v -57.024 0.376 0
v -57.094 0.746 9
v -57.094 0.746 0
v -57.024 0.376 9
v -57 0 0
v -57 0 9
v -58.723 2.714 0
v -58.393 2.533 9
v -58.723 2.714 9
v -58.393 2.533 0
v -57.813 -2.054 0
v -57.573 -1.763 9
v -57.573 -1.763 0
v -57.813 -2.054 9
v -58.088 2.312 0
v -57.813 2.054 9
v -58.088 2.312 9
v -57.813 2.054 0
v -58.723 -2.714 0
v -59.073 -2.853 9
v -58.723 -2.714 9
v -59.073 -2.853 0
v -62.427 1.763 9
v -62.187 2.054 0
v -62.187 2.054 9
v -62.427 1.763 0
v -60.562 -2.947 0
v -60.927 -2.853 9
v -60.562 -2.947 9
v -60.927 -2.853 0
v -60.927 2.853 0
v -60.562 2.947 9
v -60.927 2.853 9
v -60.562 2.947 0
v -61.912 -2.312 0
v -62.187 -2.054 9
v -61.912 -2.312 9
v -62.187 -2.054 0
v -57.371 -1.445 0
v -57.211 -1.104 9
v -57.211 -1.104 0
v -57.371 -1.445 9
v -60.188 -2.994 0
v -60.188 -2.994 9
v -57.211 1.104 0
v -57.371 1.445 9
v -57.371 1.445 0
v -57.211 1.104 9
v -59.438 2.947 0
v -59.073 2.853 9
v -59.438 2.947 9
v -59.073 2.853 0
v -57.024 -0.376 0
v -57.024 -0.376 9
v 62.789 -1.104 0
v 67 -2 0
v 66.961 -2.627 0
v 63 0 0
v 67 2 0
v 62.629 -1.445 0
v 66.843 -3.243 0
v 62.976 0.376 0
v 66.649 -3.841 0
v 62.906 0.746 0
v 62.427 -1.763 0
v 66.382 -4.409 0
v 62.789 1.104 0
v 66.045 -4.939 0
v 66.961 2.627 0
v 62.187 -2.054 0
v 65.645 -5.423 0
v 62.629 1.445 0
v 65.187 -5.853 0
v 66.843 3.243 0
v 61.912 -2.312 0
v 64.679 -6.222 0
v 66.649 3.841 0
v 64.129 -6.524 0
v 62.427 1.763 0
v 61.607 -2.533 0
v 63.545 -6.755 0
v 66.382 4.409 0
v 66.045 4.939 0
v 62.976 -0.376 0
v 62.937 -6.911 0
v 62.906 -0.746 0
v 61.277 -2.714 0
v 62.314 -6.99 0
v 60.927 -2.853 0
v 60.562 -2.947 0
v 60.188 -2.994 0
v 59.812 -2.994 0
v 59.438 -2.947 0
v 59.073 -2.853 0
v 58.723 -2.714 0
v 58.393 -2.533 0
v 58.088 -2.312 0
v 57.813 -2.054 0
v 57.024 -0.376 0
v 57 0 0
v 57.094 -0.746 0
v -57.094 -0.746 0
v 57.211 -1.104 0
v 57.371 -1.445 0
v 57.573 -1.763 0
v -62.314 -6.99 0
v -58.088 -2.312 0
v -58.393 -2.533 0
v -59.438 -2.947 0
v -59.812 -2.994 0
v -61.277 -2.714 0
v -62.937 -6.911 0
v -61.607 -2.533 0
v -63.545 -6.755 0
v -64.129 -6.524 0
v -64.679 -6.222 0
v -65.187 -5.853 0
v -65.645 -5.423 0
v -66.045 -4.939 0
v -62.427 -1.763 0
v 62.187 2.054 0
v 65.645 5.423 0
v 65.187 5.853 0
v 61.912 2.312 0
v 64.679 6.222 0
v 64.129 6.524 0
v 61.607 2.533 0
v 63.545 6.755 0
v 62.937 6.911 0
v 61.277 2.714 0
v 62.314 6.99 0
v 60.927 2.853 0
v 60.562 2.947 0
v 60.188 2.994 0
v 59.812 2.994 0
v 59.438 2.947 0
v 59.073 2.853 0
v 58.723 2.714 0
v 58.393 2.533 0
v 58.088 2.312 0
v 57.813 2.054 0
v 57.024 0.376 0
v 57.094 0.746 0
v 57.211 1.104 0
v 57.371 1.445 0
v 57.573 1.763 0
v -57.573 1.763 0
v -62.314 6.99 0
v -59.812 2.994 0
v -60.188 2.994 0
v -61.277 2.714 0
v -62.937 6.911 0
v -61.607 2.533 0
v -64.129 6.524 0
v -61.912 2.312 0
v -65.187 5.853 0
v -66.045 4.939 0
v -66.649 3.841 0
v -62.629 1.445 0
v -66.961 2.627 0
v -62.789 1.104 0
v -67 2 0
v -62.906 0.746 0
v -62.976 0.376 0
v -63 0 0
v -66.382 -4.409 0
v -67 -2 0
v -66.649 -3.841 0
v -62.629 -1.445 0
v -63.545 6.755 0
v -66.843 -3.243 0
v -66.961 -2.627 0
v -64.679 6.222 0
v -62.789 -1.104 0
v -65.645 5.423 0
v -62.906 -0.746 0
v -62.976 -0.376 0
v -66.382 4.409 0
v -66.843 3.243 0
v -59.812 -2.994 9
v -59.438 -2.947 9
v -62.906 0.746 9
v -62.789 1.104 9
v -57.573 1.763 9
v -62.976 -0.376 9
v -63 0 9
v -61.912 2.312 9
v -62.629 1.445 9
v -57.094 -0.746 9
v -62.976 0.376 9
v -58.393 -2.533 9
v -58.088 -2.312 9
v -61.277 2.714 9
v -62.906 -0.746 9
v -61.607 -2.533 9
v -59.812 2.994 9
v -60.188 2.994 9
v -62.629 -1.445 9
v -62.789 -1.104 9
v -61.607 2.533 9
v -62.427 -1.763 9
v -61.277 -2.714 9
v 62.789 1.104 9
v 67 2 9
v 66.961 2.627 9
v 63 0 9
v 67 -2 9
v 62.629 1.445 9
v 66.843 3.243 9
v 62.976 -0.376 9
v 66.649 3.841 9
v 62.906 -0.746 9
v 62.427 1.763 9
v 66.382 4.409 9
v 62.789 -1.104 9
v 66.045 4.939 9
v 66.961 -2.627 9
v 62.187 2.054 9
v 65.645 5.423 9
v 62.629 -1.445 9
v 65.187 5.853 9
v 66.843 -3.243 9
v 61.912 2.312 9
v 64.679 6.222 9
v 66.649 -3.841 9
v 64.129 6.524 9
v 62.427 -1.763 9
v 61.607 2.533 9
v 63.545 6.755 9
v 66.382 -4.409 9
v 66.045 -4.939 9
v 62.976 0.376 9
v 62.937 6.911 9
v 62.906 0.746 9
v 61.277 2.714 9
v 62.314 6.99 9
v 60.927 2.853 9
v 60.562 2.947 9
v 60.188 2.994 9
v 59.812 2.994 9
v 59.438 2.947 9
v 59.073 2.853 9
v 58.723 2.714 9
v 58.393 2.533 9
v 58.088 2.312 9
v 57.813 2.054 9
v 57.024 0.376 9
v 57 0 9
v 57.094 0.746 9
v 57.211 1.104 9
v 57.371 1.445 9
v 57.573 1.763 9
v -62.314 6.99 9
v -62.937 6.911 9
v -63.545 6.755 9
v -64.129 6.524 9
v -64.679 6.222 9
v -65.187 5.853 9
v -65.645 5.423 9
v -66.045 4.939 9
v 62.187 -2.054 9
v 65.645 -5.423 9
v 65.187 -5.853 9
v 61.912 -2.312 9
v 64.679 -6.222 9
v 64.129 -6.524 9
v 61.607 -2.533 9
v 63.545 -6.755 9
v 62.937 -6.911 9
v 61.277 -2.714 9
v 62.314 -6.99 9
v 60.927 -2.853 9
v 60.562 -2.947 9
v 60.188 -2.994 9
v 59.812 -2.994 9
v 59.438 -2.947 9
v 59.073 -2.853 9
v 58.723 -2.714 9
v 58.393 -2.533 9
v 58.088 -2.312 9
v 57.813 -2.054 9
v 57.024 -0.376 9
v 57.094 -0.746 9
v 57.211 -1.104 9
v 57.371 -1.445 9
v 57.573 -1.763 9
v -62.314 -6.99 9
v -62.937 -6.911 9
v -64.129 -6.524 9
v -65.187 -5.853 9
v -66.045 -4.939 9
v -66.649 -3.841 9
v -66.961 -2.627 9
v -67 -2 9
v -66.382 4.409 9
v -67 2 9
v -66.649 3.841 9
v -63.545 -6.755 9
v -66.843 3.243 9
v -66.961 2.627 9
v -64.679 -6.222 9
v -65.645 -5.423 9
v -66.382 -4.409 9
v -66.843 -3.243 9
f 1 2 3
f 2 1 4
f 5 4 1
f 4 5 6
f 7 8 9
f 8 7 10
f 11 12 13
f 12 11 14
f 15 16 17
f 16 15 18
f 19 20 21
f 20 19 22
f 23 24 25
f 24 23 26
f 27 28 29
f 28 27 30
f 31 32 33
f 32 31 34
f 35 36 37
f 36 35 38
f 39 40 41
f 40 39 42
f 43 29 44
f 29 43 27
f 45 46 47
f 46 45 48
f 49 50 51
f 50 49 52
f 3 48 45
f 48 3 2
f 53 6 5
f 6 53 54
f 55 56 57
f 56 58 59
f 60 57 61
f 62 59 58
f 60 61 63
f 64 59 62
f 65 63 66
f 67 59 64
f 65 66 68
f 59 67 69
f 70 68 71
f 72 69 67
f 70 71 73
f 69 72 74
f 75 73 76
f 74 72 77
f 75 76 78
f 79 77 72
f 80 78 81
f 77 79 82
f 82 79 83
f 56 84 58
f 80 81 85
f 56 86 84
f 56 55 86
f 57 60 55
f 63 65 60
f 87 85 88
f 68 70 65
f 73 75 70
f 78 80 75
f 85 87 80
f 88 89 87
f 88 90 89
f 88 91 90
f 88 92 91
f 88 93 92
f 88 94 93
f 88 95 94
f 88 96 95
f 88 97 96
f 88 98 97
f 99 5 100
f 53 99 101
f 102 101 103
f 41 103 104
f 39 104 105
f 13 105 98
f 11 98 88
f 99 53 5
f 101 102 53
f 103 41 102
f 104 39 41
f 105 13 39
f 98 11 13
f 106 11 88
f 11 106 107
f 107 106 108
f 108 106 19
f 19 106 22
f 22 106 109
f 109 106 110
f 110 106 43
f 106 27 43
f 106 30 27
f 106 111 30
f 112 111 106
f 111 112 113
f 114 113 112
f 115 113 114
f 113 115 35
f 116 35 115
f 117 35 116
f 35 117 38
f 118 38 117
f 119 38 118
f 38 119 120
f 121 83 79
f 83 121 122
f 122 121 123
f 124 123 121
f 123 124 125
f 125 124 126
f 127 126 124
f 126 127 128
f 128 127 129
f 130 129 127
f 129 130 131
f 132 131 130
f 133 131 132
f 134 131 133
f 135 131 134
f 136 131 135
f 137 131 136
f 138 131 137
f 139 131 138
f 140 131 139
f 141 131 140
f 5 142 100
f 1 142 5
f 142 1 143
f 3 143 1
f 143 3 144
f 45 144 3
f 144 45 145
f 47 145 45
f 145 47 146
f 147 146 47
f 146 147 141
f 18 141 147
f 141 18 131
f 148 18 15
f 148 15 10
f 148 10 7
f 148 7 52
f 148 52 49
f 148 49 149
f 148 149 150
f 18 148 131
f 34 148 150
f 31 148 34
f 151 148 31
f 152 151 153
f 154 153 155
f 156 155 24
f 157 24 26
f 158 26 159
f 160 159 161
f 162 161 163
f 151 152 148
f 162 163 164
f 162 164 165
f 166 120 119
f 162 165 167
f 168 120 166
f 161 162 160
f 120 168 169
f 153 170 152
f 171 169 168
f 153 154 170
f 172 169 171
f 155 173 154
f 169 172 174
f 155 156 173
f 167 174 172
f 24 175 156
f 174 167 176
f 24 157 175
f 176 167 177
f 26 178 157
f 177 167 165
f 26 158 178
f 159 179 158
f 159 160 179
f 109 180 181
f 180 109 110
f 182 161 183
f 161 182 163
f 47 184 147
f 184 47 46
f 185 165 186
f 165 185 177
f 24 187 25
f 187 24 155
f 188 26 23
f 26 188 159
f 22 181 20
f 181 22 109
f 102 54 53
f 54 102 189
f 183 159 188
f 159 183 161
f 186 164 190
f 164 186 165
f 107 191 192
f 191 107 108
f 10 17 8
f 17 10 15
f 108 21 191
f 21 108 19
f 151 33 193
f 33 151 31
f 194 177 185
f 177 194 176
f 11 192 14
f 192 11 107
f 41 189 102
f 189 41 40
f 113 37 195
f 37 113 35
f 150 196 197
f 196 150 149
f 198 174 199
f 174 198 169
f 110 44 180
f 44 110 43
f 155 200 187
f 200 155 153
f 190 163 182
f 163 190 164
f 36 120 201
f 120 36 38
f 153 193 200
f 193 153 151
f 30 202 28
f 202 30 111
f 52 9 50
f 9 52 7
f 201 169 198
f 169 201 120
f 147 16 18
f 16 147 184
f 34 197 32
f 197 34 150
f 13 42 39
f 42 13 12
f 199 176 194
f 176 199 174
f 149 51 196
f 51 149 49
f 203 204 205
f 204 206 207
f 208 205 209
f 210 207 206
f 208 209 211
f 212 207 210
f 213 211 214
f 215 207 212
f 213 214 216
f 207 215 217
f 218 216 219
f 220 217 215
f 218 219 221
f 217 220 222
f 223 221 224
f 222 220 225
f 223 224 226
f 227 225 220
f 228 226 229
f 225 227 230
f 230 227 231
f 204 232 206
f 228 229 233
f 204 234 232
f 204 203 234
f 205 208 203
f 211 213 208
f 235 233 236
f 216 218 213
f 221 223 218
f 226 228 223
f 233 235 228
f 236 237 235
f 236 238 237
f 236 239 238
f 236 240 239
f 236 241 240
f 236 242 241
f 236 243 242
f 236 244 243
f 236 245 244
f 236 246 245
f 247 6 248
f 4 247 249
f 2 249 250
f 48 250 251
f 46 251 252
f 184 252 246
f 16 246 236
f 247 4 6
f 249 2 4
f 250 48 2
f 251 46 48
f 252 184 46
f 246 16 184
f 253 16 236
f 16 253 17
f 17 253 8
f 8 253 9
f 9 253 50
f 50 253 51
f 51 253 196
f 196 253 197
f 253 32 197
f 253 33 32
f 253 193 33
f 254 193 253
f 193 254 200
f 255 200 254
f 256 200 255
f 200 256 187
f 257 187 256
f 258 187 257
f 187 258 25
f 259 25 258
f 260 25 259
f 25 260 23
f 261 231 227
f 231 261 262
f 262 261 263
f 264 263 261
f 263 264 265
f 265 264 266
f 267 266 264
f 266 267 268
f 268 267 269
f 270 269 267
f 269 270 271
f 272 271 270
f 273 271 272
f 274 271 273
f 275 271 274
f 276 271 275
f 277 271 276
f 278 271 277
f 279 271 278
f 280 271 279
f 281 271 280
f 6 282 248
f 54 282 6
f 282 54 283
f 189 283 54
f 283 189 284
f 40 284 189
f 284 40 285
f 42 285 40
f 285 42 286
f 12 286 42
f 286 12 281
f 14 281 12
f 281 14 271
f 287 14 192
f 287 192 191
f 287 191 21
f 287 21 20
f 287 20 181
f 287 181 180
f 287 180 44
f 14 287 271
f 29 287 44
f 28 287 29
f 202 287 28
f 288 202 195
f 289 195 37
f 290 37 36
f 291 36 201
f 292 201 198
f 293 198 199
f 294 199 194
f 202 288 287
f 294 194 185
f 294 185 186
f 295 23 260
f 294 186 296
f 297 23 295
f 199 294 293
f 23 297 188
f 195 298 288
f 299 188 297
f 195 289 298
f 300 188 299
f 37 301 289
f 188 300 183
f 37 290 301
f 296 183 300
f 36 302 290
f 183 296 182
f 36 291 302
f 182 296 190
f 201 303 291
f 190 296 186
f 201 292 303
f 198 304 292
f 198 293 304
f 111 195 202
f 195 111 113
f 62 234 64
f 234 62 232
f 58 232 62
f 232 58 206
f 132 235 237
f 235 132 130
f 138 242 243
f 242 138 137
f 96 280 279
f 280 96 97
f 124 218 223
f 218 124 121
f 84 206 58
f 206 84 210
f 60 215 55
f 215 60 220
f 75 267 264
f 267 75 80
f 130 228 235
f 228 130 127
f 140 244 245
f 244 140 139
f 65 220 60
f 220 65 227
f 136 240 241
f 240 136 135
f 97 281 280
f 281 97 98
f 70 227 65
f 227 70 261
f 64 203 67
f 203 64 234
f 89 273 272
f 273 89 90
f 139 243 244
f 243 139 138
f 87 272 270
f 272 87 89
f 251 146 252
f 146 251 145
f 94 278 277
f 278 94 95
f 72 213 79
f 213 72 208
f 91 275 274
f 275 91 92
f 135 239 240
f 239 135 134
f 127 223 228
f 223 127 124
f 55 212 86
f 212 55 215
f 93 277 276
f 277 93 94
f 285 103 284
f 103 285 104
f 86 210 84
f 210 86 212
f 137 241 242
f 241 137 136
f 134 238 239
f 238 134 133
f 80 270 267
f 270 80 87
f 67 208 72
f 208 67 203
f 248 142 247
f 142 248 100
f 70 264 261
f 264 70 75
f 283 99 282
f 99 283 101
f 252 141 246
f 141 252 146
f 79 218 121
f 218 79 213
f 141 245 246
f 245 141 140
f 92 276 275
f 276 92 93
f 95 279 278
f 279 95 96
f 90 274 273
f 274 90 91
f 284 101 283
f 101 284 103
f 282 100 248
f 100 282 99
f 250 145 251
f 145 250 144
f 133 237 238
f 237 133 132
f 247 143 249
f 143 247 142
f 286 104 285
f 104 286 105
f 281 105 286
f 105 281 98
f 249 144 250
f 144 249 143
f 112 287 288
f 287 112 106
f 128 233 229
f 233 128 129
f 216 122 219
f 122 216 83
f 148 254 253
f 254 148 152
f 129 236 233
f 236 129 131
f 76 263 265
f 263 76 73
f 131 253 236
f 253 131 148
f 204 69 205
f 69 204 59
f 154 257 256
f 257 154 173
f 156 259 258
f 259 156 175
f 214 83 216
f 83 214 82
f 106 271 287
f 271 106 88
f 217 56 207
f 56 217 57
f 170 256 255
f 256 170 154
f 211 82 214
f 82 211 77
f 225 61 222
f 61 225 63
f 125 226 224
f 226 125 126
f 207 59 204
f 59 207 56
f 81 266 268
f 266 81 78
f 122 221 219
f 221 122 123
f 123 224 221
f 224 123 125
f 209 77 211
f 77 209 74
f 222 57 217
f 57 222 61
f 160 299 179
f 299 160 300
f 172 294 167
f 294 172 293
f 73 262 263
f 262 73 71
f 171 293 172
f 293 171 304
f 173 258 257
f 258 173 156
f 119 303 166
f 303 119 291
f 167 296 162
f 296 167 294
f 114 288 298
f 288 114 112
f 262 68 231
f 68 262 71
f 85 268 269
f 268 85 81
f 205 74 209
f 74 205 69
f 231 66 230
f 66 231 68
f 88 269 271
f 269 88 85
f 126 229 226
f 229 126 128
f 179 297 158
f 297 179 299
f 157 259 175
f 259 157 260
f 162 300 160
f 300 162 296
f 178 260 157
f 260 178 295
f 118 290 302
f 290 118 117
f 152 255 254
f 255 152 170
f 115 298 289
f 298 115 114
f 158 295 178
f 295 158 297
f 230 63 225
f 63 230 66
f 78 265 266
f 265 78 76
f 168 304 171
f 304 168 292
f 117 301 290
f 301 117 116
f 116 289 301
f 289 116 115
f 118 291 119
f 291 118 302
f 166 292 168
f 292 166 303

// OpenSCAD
$fn = 50;


difference() {
	union() {
		hull() {
			translate(v = [-62.0000000000, 2.0000000000, 0]) {
				cylinder(h = 9, r = 5);
			}
			translate(v = [62.0000000000, 2.0000000000, 0]) {
				cylinder(h = 9, r = 5);
			}
			translate(v = [-62.0000000000, -2.0000000000, 0]) {
				cylinder(h = 9, r = 5);
			}
			translate(v = [62.0000000000, -2.0000000000, 0]) {
				cylinder(h = 9, r = 5);
			}
		}
	}
	union() {
		translate(v = [-60.0000000000, 0.0000000000, 0]) {
			cylinder(h = 9, r = 3.0000000000);
		}
		translate(v = [60.0000000000, 0.0000000000, 0]) {
			cylinder(h = 9, r = 3.0000000000);
		}
		translate(v = [-60.0000000000, 0.0000000000, 0]) {
			cylinder(h = 9, r = 1.5000000000);
		}
		translate(v = [60.0000000000, 0.0000000000, 0]) {
			cylinder(h = 9, r = 1.5000000000);
		}
		translate(v = [-60.0000000000, 0.0000000000, 0]) {
			cylinder(h = 9, r = 1.5000000000);
		}
		translate(v = [60.0000000000, 0.0000000000, 0]) {
			cylinder(h = 9, r = 1.5000000000);
		}
		translate(v = [-60.0000000000, 0.0000000000, 0]) {
			cylinder(h = 9, r = 1.5000000000);
		}
		translate(v = [60.0000000000, 0.0000000000, 0]) {
			cylinder(h = 9, r = 1.5000000000);
		}
	}
}
